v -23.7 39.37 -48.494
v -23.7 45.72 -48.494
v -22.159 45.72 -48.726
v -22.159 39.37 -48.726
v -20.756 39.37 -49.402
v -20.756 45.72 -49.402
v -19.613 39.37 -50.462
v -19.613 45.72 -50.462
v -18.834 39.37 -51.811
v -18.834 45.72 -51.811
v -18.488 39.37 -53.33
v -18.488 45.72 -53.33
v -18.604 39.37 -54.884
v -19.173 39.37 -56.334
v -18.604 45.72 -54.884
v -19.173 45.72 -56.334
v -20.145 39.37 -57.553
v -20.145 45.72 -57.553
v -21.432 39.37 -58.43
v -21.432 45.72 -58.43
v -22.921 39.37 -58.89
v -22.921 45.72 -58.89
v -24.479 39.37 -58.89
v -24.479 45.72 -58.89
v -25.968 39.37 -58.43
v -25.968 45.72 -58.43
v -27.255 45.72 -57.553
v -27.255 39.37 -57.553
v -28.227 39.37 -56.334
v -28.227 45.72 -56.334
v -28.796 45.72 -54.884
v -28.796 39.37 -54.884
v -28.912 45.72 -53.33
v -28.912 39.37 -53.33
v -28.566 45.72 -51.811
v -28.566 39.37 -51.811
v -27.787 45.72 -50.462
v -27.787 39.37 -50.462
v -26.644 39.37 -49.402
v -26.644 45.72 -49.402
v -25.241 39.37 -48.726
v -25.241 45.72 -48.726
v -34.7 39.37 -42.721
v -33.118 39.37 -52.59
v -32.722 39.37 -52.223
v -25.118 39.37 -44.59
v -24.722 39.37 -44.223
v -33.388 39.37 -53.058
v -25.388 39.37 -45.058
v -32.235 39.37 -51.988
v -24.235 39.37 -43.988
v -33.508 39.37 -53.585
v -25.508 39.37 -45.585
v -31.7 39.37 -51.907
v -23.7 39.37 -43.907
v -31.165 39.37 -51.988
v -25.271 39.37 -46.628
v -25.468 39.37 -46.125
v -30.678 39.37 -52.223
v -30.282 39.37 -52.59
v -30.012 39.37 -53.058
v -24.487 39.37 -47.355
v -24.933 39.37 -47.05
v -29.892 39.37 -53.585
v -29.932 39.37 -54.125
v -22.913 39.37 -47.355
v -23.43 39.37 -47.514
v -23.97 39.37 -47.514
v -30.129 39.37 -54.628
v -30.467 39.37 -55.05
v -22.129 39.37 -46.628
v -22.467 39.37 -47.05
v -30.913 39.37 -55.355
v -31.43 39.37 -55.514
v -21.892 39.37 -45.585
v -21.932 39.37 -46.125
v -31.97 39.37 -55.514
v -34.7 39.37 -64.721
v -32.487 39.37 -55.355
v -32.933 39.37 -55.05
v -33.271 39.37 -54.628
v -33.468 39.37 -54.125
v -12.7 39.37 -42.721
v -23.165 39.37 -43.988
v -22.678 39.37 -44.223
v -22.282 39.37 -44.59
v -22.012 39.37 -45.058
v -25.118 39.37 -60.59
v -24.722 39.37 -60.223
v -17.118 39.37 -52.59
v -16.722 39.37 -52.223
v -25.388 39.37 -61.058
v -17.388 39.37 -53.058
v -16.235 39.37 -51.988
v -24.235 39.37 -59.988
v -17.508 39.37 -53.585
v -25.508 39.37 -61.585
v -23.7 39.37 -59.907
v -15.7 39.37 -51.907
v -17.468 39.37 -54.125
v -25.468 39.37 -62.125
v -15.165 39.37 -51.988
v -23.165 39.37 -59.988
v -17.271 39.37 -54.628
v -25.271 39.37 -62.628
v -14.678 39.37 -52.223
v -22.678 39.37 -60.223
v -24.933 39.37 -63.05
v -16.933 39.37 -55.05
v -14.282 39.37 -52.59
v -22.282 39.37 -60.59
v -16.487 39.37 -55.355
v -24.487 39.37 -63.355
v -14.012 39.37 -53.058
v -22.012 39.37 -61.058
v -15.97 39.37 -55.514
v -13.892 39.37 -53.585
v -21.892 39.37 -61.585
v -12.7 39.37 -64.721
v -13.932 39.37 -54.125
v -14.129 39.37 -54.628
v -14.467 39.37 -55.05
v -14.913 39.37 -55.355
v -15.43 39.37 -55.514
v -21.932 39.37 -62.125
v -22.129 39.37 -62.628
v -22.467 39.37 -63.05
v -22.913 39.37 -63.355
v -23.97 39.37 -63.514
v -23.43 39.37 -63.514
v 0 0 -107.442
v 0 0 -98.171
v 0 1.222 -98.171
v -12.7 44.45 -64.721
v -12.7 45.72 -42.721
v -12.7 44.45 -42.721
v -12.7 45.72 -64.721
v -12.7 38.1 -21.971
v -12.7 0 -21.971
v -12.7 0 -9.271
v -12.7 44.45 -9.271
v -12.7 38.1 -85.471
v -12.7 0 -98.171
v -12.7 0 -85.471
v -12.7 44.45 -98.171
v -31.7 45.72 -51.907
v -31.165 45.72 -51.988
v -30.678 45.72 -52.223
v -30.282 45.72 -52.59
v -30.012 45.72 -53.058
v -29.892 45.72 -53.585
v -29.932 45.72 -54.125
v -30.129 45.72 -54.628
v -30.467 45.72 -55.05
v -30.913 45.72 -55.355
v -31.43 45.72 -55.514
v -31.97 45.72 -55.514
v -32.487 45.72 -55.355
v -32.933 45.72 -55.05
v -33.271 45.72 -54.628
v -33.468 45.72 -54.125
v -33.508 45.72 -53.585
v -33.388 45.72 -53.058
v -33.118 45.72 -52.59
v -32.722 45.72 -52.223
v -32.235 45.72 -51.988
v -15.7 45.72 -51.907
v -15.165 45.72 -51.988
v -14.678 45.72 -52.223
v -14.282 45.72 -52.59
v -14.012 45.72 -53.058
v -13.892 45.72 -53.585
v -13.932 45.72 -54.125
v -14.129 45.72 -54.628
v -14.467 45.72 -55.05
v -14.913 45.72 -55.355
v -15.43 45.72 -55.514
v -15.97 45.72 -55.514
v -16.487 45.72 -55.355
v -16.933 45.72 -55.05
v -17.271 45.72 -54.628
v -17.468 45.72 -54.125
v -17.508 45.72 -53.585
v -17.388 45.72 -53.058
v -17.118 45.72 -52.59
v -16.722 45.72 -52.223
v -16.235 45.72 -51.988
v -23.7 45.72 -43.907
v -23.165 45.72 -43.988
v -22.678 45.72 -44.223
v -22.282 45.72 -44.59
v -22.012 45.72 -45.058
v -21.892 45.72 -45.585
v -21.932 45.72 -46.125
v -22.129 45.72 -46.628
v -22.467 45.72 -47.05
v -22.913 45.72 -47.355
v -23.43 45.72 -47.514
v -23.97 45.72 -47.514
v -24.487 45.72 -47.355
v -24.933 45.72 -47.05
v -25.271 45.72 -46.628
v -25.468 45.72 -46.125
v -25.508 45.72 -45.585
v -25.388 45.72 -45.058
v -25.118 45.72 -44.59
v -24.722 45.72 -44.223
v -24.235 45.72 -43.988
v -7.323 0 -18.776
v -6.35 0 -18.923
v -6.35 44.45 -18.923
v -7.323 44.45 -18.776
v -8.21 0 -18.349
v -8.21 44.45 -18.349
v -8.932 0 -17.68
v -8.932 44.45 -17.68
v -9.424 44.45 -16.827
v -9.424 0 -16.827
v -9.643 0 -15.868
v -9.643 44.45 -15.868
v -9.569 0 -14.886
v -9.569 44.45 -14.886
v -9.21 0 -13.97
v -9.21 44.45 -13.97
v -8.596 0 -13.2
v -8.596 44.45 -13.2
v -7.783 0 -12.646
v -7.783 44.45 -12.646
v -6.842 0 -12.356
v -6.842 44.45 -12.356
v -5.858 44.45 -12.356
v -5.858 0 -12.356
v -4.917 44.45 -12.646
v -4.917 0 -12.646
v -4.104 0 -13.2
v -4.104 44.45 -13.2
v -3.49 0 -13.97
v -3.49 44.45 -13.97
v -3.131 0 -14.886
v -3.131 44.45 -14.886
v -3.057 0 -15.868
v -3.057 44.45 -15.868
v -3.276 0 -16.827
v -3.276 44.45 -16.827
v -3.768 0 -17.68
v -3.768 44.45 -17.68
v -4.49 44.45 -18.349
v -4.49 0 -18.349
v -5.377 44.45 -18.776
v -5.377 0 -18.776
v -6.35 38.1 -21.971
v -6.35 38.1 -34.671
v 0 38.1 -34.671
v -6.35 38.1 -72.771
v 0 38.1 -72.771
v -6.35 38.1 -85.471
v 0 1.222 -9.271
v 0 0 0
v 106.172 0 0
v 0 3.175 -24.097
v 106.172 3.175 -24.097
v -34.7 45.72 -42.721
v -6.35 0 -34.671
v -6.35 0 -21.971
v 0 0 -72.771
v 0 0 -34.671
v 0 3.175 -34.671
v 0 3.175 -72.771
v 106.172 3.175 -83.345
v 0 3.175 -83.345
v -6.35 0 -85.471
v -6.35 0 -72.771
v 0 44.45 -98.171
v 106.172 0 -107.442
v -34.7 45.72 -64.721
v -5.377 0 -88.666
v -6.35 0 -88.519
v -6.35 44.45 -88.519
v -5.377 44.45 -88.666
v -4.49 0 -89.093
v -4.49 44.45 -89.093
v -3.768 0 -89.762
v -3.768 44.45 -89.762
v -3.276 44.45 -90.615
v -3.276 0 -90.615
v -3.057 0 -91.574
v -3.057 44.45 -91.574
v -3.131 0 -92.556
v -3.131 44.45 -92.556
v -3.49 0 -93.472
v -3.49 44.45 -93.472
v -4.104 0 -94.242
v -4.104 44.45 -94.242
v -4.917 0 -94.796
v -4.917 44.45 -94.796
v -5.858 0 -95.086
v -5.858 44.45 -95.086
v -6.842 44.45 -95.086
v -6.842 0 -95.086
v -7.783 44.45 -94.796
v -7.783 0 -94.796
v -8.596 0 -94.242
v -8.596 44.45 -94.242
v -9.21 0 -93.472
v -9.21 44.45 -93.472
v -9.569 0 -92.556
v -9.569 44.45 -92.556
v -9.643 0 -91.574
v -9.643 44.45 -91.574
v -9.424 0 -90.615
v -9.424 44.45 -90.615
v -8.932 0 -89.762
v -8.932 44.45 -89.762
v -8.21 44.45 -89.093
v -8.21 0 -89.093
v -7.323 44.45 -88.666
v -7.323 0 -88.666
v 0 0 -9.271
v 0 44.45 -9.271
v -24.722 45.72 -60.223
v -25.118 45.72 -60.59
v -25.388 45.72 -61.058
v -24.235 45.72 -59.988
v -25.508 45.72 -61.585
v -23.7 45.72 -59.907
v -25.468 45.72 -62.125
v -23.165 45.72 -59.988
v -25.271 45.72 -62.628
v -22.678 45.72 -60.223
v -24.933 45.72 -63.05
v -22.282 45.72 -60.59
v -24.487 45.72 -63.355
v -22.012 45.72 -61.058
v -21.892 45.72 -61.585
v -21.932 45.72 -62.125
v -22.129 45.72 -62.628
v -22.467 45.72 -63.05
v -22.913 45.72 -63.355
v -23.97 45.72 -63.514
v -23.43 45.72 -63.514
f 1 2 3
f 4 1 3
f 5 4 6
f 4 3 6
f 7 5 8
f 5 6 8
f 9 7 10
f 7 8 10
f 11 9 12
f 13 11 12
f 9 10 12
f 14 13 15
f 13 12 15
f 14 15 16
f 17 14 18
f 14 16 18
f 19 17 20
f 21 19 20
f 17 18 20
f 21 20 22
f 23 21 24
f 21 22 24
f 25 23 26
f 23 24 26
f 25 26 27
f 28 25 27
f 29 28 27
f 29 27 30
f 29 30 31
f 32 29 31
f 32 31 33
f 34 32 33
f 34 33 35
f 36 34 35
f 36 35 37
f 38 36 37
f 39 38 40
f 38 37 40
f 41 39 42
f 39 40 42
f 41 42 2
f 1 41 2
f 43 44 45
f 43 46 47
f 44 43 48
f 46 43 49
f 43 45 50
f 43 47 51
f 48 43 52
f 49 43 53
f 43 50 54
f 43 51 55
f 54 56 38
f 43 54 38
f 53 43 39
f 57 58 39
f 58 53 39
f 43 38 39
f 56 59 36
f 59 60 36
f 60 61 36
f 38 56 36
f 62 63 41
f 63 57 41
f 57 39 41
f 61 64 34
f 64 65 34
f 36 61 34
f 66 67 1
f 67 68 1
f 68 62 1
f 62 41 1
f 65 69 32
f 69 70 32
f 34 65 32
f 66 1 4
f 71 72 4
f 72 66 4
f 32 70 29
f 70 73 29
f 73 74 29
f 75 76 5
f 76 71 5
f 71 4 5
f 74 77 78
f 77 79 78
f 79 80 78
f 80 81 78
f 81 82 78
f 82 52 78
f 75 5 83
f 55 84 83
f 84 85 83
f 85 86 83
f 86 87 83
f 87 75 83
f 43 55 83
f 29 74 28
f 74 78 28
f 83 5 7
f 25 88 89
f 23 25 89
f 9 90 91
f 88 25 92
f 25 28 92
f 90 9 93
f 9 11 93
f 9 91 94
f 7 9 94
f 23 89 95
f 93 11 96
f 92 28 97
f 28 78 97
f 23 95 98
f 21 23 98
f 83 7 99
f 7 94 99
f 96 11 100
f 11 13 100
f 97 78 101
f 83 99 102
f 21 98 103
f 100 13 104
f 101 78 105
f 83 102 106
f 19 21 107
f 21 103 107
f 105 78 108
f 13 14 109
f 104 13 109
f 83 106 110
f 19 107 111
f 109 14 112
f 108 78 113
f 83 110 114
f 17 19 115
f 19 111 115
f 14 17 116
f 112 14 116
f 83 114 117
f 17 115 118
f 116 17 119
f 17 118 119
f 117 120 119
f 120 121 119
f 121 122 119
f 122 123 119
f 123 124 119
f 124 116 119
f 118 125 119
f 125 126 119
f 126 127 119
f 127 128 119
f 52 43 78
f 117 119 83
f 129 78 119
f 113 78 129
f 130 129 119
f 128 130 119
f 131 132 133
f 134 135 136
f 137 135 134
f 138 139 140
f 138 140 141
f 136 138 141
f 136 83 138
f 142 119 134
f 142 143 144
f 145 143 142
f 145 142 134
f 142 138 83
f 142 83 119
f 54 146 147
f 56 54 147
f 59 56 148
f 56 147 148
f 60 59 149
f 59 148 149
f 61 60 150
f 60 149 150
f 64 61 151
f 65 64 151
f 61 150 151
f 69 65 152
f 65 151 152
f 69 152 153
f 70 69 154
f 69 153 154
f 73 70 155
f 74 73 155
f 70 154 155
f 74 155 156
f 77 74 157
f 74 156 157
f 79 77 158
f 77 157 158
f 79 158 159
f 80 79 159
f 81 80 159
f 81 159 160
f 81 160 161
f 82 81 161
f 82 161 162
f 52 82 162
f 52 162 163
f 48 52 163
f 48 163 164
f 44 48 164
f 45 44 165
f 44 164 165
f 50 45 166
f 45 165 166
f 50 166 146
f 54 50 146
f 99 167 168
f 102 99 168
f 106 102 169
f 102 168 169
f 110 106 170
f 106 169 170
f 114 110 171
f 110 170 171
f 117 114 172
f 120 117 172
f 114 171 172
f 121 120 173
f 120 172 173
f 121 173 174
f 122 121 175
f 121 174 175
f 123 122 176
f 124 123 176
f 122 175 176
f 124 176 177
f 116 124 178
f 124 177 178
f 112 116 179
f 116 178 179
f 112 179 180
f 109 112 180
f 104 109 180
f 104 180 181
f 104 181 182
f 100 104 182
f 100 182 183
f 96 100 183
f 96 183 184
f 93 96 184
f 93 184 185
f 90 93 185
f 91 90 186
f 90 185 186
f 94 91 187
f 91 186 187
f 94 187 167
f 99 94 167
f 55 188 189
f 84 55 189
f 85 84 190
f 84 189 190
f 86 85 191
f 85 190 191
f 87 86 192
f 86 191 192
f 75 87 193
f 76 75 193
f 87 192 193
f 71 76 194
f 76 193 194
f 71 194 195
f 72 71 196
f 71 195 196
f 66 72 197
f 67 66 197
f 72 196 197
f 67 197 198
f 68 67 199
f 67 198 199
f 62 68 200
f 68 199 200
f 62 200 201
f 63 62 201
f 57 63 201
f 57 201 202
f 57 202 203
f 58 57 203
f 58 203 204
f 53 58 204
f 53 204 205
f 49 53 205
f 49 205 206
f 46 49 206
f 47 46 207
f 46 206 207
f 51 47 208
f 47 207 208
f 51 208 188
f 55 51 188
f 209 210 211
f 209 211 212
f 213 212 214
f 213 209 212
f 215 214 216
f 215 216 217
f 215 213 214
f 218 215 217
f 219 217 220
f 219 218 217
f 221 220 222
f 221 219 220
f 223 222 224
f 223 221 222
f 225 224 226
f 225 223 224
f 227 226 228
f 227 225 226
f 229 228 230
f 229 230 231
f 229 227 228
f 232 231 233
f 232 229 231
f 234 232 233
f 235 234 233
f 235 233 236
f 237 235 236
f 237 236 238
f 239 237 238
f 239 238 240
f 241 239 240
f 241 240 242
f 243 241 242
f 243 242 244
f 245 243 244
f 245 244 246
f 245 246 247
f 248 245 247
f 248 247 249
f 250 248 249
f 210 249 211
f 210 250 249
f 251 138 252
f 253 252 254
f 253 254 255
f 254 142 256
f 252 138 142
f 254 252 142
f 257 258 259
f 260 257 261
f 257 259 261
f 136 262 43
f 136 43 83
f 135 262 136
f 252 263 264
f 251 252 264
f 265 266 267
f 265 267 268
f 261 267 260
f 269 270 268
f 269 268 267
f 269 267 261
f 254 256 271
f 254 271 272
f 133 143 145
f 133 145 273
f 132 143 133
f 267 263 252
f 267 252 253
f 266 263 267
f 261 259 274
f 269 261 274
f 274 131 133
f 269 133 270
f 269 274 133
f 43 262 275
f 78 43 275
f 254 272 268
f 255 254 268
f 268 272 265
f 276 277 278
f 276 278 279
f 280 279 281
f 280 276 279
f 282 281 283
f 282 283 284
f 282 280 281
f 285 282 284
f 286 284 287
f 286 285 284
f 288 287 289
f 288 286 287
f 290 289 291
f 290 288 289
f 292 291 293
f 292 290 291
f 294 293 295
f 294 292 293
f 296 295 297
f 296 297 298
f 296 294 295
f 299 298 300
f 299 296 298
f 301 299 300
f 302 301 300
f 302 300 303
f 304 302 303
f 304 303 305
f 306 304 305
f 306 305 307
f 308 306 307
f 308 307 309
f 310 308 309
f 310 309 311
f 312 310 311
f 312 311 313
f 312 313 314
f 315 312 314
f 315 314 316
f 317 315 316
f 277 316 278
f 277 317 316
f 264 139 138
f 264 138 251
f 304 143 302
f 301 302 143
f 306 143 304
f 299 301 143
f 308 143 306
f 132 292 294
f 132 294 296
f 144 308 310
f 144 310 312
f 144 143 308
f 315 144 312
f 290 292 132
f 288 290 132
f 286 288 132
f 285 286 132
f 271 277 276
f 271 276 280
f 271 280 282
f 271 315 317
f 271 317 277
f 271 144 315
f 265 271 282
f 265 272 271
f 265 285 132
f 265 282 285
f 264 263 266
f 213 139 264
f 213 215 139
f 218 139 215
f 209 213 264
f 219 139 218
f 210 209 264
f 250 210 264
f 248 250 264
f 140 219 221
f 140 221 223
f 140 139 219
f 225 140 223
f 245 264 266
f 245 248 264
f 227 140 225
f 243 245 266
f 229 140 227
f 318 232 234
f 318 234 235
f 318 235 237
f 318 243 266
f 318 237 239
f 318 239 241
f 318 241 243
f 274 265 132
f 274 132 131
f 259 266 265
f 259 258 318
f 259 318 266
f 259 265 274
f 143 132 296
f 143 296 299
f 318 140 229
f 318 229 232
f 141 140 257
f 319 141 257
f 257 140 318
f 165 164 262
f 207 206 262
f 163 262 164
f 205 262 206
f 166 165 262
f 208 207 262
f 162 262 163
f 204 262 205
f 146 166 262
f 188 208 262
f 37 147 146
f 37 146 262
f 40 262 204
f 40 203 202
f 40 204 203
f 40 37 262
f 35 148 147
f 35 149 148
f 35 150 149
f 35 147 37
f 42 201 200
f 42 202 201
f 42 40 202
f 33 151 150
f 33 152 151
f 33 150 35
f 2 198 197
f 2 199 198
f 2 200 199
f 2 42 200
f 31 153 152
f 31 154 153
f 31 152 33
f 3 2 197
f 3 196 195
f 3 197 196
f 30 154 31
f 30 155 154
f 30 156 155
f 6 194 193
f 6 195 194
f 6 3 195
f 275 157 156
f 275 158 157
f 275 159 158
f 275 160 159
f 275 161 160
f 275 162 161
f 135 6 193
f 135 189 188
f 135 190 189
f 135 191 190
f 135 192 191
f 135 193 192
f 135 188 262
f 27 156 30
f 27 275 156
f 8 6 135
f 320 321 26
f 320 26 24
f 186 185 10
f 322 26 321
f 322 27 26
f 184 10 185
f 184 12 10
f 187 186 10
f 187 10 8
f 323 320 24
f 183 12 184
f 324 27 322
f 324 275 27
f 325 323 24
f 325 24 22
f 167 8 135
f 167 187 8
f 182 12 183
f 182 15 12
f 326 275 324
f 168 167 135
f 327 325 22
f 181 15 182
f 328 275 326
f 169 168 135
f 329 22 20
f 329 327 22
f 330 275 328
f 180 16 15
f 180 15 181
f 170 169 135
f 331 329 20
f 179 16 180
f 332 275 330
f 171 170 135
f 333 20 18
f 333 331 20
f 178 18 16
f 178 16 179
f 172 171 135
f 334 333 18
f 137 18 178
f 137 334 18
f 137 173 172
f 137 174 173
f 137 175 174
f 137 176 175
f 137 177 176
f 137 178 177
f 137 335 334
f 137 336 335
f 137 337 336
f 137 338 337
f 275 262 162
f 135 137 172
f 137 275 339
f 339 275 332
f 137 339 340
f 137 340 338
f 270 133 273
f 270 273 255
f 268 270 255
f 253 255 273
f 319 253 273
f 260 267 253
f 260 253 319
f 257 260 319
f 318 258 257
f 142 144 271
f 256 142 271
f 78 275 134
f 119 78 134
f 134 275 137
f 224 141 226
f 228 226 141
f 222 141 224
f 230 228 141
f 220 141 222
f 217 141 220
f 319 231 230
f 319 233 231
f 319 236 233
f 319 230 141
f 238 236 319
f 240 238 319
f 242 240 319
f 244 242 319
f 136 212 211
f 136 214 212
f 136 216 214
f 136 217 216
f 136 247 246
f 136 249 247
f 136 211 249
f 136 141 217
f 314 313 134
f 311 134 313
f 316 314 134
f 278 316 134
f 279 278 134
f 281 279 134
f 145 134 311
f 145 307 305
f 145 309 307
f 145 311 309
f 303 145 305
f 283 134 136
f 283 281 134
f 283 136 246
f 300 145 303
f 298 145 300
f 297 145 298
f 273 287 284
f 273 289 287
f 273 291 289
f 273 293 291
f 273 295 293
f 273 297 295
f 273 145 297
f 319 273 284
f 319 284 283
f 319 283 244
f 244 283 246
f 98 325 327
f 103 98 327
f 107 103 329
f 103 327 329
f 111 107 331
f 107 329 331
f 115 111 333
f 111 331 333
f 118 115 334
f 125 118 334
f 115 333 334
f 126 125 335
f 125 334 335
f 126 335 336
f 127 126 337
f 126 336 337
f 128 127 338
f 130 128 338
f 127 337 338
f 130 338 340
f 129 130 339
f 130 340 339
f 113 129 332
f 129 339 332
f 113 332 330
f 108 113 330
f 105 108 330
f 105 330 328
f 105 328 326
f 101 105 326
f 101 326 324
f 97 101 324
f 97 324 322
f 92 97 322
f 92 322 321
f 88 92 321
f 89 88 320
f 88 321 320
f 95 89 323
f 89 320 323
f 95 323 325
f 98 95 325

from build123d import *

# Parameters (mm, degrees)
SKETCH1_W           = 106.172
SKETCH1_H           = 107.442
BOSS_EXTRUDE1_DEPTH = 3.175
SKETCH3_W           = 12.7
SKETCH3_H           = 12.7
SKETCH3_R           = 3.302
BOSS_EXTRUDE2_DEPTH = 44.45
CUT_EXTRUDE1_DEPTH  = 106.172
SKETCH6_W           = 12.7
SKETCH6_H           = 6.35
BOSS_EXTRUDE3_DEPTH = 63.5
BOSS_EXTRUDE5_START = 1.27
SKETCH11_W          = 21.999999942
SKETCH11_H          = 21.999999942
SKETCH11_R          = 5.22699996
SKETCH11_R_2        = 1.813500056
BOSS_EXTRUDE5_DEPTH = 6.35
SKETCH12_W          = 6.35
SKETCH12_H          = 12.7
BOSS_EXTRUDE6_DEPTH = 38.1


with BuildPart() as part:
    # Sketch1 → Boss-Extrude1 (new body)
    with BuildSketch(Plane(origin=(0, 0, 0), x_dir=(1, 0, 0), z_dir=(0, 1, 0))):
        with Locations((53.086, 53.721)):
            Rectangle(SKETCH1_W, SKETCH1_H)
    extrude(amount=BOSS_EXTRUDE1_DEPTH)

    # Sketch3 → Boss-Extrude2 (add)
    # profile 1 of 2: a face of its own
    with BuildSketch(Plane(origin=(0, 0, 0), x_dir=(1, 0, 0), z_dir=(0, 1, 0))):
        with Locations((-6.35, 91.821)):
            Rectangle(SKETCH3_W, SKETCH3_H)
        with Locations(Location((-6.35, 91.821, 0), (0, 0, 270))):
            Circle(SKETCH3_R, mode=Mode.SUBTRACT)
    # profile 2 of 2: a face of its own
    with BuildSketch(Plane(origin=(0, 0, 0), x_dir=(1, 0, 0), z_dir=(0, 1, 0))):
        with Locations((-6.35, 15.621)):
            Rectangle(SKETCH3_W, SKETCH3_H)
        with Locations(Location((-6.35, 15.621, 0), (0, 0, 90))):
            Circle(SKETCH3_R, mode=Mode.SUBTRACT)
    extrude(amount=BOSS_EXTRUDE2_DEPTH)

    # Sketch4 → Cut-Extrude1 (cut)
    with BuildSketch(Plane(origin=(106.172, 0, 0), x_dir=(0, 0, -1), z_dir=(1, 0, 0))):
        Polygon((0, 0), (24.096533231, 3.175), (0, 3.175), align=None)
        Polygon((107.442, 3.175), (107.442, 0), (83.345466769, 3.175), align=None)
    extrude(amount=-CUT_EXTRUDE1_DEPTH, mode=Mode.SUBTRACT)

    # Sketch6 → Boss-Extrude3 (add)
    with BuildSketch(Plane.XY.offset(-85.471)):
        with Locations((-6.35, 41.275)):
            Rectangle(SKETCH6_W, SKETCH6_H)
    extrude(amount=BOSS_EXTRUDE3_DEPTH)

    # Sketch11 → Boss-Extrude5 (add)
    with BuildSketch(Plane(origin=(0, 44.45, 0), x_dir=(1, 0, 0), z_dir=(0, 1, 0)).offset(BOSS_EXTRUDE5_START)):
        with Locations((-23.699999971, 53.721)):
            Rectangle(SKETCH11_W, SKETCH11_H)
        with Locations(Location((-23.699999971, 53.721, 0), (0, 0, 270))):
            Circle(SKETCH11_R, mode=Mode.SUBTRACT)
        with Locations(Location((-23.699999971, 61.721000002, 0), (0, 0, 270))):
            Circle(SKETCH11_R_2, mode=Mode.SUBTRACT)
        with Locations(Location((-15.699999969, 53.721, 0), (0, 0, 270))):
            Circle(SKETCH11_R_2, mode=Mode.SUBTRACT)
        with Locations(Location((-23.699999971, 45.720999998, 0), (0, 0, 270))):
            Circle(SKETCH11_R_2, mode=Mode.SUBTRACT)
        with Locations(Location((-31.699999973, 53.721, 0), (0, 0, 270))):
            Circle(SKETCH11_R_2, mode=Mode.SUBTRACT)
    extrude(amount=-BOSS_EXTRUDE5_DEPTH)

    # Sketch12 → Boss-Extrude6 (add)
    with BuildSketch(Plane.XZ):
        with Locations((-3.175, -28.321)):
            Rectangle(SKETCH12_W, SKETCH12_H)
        with Locations((-3.175, -79.121)):
            Rectangle(SKETCH12_W, SKETCH12_H)
    extrude(amount=-BOSS_EXTRUDE6_DEPTH)


solid = part.part
